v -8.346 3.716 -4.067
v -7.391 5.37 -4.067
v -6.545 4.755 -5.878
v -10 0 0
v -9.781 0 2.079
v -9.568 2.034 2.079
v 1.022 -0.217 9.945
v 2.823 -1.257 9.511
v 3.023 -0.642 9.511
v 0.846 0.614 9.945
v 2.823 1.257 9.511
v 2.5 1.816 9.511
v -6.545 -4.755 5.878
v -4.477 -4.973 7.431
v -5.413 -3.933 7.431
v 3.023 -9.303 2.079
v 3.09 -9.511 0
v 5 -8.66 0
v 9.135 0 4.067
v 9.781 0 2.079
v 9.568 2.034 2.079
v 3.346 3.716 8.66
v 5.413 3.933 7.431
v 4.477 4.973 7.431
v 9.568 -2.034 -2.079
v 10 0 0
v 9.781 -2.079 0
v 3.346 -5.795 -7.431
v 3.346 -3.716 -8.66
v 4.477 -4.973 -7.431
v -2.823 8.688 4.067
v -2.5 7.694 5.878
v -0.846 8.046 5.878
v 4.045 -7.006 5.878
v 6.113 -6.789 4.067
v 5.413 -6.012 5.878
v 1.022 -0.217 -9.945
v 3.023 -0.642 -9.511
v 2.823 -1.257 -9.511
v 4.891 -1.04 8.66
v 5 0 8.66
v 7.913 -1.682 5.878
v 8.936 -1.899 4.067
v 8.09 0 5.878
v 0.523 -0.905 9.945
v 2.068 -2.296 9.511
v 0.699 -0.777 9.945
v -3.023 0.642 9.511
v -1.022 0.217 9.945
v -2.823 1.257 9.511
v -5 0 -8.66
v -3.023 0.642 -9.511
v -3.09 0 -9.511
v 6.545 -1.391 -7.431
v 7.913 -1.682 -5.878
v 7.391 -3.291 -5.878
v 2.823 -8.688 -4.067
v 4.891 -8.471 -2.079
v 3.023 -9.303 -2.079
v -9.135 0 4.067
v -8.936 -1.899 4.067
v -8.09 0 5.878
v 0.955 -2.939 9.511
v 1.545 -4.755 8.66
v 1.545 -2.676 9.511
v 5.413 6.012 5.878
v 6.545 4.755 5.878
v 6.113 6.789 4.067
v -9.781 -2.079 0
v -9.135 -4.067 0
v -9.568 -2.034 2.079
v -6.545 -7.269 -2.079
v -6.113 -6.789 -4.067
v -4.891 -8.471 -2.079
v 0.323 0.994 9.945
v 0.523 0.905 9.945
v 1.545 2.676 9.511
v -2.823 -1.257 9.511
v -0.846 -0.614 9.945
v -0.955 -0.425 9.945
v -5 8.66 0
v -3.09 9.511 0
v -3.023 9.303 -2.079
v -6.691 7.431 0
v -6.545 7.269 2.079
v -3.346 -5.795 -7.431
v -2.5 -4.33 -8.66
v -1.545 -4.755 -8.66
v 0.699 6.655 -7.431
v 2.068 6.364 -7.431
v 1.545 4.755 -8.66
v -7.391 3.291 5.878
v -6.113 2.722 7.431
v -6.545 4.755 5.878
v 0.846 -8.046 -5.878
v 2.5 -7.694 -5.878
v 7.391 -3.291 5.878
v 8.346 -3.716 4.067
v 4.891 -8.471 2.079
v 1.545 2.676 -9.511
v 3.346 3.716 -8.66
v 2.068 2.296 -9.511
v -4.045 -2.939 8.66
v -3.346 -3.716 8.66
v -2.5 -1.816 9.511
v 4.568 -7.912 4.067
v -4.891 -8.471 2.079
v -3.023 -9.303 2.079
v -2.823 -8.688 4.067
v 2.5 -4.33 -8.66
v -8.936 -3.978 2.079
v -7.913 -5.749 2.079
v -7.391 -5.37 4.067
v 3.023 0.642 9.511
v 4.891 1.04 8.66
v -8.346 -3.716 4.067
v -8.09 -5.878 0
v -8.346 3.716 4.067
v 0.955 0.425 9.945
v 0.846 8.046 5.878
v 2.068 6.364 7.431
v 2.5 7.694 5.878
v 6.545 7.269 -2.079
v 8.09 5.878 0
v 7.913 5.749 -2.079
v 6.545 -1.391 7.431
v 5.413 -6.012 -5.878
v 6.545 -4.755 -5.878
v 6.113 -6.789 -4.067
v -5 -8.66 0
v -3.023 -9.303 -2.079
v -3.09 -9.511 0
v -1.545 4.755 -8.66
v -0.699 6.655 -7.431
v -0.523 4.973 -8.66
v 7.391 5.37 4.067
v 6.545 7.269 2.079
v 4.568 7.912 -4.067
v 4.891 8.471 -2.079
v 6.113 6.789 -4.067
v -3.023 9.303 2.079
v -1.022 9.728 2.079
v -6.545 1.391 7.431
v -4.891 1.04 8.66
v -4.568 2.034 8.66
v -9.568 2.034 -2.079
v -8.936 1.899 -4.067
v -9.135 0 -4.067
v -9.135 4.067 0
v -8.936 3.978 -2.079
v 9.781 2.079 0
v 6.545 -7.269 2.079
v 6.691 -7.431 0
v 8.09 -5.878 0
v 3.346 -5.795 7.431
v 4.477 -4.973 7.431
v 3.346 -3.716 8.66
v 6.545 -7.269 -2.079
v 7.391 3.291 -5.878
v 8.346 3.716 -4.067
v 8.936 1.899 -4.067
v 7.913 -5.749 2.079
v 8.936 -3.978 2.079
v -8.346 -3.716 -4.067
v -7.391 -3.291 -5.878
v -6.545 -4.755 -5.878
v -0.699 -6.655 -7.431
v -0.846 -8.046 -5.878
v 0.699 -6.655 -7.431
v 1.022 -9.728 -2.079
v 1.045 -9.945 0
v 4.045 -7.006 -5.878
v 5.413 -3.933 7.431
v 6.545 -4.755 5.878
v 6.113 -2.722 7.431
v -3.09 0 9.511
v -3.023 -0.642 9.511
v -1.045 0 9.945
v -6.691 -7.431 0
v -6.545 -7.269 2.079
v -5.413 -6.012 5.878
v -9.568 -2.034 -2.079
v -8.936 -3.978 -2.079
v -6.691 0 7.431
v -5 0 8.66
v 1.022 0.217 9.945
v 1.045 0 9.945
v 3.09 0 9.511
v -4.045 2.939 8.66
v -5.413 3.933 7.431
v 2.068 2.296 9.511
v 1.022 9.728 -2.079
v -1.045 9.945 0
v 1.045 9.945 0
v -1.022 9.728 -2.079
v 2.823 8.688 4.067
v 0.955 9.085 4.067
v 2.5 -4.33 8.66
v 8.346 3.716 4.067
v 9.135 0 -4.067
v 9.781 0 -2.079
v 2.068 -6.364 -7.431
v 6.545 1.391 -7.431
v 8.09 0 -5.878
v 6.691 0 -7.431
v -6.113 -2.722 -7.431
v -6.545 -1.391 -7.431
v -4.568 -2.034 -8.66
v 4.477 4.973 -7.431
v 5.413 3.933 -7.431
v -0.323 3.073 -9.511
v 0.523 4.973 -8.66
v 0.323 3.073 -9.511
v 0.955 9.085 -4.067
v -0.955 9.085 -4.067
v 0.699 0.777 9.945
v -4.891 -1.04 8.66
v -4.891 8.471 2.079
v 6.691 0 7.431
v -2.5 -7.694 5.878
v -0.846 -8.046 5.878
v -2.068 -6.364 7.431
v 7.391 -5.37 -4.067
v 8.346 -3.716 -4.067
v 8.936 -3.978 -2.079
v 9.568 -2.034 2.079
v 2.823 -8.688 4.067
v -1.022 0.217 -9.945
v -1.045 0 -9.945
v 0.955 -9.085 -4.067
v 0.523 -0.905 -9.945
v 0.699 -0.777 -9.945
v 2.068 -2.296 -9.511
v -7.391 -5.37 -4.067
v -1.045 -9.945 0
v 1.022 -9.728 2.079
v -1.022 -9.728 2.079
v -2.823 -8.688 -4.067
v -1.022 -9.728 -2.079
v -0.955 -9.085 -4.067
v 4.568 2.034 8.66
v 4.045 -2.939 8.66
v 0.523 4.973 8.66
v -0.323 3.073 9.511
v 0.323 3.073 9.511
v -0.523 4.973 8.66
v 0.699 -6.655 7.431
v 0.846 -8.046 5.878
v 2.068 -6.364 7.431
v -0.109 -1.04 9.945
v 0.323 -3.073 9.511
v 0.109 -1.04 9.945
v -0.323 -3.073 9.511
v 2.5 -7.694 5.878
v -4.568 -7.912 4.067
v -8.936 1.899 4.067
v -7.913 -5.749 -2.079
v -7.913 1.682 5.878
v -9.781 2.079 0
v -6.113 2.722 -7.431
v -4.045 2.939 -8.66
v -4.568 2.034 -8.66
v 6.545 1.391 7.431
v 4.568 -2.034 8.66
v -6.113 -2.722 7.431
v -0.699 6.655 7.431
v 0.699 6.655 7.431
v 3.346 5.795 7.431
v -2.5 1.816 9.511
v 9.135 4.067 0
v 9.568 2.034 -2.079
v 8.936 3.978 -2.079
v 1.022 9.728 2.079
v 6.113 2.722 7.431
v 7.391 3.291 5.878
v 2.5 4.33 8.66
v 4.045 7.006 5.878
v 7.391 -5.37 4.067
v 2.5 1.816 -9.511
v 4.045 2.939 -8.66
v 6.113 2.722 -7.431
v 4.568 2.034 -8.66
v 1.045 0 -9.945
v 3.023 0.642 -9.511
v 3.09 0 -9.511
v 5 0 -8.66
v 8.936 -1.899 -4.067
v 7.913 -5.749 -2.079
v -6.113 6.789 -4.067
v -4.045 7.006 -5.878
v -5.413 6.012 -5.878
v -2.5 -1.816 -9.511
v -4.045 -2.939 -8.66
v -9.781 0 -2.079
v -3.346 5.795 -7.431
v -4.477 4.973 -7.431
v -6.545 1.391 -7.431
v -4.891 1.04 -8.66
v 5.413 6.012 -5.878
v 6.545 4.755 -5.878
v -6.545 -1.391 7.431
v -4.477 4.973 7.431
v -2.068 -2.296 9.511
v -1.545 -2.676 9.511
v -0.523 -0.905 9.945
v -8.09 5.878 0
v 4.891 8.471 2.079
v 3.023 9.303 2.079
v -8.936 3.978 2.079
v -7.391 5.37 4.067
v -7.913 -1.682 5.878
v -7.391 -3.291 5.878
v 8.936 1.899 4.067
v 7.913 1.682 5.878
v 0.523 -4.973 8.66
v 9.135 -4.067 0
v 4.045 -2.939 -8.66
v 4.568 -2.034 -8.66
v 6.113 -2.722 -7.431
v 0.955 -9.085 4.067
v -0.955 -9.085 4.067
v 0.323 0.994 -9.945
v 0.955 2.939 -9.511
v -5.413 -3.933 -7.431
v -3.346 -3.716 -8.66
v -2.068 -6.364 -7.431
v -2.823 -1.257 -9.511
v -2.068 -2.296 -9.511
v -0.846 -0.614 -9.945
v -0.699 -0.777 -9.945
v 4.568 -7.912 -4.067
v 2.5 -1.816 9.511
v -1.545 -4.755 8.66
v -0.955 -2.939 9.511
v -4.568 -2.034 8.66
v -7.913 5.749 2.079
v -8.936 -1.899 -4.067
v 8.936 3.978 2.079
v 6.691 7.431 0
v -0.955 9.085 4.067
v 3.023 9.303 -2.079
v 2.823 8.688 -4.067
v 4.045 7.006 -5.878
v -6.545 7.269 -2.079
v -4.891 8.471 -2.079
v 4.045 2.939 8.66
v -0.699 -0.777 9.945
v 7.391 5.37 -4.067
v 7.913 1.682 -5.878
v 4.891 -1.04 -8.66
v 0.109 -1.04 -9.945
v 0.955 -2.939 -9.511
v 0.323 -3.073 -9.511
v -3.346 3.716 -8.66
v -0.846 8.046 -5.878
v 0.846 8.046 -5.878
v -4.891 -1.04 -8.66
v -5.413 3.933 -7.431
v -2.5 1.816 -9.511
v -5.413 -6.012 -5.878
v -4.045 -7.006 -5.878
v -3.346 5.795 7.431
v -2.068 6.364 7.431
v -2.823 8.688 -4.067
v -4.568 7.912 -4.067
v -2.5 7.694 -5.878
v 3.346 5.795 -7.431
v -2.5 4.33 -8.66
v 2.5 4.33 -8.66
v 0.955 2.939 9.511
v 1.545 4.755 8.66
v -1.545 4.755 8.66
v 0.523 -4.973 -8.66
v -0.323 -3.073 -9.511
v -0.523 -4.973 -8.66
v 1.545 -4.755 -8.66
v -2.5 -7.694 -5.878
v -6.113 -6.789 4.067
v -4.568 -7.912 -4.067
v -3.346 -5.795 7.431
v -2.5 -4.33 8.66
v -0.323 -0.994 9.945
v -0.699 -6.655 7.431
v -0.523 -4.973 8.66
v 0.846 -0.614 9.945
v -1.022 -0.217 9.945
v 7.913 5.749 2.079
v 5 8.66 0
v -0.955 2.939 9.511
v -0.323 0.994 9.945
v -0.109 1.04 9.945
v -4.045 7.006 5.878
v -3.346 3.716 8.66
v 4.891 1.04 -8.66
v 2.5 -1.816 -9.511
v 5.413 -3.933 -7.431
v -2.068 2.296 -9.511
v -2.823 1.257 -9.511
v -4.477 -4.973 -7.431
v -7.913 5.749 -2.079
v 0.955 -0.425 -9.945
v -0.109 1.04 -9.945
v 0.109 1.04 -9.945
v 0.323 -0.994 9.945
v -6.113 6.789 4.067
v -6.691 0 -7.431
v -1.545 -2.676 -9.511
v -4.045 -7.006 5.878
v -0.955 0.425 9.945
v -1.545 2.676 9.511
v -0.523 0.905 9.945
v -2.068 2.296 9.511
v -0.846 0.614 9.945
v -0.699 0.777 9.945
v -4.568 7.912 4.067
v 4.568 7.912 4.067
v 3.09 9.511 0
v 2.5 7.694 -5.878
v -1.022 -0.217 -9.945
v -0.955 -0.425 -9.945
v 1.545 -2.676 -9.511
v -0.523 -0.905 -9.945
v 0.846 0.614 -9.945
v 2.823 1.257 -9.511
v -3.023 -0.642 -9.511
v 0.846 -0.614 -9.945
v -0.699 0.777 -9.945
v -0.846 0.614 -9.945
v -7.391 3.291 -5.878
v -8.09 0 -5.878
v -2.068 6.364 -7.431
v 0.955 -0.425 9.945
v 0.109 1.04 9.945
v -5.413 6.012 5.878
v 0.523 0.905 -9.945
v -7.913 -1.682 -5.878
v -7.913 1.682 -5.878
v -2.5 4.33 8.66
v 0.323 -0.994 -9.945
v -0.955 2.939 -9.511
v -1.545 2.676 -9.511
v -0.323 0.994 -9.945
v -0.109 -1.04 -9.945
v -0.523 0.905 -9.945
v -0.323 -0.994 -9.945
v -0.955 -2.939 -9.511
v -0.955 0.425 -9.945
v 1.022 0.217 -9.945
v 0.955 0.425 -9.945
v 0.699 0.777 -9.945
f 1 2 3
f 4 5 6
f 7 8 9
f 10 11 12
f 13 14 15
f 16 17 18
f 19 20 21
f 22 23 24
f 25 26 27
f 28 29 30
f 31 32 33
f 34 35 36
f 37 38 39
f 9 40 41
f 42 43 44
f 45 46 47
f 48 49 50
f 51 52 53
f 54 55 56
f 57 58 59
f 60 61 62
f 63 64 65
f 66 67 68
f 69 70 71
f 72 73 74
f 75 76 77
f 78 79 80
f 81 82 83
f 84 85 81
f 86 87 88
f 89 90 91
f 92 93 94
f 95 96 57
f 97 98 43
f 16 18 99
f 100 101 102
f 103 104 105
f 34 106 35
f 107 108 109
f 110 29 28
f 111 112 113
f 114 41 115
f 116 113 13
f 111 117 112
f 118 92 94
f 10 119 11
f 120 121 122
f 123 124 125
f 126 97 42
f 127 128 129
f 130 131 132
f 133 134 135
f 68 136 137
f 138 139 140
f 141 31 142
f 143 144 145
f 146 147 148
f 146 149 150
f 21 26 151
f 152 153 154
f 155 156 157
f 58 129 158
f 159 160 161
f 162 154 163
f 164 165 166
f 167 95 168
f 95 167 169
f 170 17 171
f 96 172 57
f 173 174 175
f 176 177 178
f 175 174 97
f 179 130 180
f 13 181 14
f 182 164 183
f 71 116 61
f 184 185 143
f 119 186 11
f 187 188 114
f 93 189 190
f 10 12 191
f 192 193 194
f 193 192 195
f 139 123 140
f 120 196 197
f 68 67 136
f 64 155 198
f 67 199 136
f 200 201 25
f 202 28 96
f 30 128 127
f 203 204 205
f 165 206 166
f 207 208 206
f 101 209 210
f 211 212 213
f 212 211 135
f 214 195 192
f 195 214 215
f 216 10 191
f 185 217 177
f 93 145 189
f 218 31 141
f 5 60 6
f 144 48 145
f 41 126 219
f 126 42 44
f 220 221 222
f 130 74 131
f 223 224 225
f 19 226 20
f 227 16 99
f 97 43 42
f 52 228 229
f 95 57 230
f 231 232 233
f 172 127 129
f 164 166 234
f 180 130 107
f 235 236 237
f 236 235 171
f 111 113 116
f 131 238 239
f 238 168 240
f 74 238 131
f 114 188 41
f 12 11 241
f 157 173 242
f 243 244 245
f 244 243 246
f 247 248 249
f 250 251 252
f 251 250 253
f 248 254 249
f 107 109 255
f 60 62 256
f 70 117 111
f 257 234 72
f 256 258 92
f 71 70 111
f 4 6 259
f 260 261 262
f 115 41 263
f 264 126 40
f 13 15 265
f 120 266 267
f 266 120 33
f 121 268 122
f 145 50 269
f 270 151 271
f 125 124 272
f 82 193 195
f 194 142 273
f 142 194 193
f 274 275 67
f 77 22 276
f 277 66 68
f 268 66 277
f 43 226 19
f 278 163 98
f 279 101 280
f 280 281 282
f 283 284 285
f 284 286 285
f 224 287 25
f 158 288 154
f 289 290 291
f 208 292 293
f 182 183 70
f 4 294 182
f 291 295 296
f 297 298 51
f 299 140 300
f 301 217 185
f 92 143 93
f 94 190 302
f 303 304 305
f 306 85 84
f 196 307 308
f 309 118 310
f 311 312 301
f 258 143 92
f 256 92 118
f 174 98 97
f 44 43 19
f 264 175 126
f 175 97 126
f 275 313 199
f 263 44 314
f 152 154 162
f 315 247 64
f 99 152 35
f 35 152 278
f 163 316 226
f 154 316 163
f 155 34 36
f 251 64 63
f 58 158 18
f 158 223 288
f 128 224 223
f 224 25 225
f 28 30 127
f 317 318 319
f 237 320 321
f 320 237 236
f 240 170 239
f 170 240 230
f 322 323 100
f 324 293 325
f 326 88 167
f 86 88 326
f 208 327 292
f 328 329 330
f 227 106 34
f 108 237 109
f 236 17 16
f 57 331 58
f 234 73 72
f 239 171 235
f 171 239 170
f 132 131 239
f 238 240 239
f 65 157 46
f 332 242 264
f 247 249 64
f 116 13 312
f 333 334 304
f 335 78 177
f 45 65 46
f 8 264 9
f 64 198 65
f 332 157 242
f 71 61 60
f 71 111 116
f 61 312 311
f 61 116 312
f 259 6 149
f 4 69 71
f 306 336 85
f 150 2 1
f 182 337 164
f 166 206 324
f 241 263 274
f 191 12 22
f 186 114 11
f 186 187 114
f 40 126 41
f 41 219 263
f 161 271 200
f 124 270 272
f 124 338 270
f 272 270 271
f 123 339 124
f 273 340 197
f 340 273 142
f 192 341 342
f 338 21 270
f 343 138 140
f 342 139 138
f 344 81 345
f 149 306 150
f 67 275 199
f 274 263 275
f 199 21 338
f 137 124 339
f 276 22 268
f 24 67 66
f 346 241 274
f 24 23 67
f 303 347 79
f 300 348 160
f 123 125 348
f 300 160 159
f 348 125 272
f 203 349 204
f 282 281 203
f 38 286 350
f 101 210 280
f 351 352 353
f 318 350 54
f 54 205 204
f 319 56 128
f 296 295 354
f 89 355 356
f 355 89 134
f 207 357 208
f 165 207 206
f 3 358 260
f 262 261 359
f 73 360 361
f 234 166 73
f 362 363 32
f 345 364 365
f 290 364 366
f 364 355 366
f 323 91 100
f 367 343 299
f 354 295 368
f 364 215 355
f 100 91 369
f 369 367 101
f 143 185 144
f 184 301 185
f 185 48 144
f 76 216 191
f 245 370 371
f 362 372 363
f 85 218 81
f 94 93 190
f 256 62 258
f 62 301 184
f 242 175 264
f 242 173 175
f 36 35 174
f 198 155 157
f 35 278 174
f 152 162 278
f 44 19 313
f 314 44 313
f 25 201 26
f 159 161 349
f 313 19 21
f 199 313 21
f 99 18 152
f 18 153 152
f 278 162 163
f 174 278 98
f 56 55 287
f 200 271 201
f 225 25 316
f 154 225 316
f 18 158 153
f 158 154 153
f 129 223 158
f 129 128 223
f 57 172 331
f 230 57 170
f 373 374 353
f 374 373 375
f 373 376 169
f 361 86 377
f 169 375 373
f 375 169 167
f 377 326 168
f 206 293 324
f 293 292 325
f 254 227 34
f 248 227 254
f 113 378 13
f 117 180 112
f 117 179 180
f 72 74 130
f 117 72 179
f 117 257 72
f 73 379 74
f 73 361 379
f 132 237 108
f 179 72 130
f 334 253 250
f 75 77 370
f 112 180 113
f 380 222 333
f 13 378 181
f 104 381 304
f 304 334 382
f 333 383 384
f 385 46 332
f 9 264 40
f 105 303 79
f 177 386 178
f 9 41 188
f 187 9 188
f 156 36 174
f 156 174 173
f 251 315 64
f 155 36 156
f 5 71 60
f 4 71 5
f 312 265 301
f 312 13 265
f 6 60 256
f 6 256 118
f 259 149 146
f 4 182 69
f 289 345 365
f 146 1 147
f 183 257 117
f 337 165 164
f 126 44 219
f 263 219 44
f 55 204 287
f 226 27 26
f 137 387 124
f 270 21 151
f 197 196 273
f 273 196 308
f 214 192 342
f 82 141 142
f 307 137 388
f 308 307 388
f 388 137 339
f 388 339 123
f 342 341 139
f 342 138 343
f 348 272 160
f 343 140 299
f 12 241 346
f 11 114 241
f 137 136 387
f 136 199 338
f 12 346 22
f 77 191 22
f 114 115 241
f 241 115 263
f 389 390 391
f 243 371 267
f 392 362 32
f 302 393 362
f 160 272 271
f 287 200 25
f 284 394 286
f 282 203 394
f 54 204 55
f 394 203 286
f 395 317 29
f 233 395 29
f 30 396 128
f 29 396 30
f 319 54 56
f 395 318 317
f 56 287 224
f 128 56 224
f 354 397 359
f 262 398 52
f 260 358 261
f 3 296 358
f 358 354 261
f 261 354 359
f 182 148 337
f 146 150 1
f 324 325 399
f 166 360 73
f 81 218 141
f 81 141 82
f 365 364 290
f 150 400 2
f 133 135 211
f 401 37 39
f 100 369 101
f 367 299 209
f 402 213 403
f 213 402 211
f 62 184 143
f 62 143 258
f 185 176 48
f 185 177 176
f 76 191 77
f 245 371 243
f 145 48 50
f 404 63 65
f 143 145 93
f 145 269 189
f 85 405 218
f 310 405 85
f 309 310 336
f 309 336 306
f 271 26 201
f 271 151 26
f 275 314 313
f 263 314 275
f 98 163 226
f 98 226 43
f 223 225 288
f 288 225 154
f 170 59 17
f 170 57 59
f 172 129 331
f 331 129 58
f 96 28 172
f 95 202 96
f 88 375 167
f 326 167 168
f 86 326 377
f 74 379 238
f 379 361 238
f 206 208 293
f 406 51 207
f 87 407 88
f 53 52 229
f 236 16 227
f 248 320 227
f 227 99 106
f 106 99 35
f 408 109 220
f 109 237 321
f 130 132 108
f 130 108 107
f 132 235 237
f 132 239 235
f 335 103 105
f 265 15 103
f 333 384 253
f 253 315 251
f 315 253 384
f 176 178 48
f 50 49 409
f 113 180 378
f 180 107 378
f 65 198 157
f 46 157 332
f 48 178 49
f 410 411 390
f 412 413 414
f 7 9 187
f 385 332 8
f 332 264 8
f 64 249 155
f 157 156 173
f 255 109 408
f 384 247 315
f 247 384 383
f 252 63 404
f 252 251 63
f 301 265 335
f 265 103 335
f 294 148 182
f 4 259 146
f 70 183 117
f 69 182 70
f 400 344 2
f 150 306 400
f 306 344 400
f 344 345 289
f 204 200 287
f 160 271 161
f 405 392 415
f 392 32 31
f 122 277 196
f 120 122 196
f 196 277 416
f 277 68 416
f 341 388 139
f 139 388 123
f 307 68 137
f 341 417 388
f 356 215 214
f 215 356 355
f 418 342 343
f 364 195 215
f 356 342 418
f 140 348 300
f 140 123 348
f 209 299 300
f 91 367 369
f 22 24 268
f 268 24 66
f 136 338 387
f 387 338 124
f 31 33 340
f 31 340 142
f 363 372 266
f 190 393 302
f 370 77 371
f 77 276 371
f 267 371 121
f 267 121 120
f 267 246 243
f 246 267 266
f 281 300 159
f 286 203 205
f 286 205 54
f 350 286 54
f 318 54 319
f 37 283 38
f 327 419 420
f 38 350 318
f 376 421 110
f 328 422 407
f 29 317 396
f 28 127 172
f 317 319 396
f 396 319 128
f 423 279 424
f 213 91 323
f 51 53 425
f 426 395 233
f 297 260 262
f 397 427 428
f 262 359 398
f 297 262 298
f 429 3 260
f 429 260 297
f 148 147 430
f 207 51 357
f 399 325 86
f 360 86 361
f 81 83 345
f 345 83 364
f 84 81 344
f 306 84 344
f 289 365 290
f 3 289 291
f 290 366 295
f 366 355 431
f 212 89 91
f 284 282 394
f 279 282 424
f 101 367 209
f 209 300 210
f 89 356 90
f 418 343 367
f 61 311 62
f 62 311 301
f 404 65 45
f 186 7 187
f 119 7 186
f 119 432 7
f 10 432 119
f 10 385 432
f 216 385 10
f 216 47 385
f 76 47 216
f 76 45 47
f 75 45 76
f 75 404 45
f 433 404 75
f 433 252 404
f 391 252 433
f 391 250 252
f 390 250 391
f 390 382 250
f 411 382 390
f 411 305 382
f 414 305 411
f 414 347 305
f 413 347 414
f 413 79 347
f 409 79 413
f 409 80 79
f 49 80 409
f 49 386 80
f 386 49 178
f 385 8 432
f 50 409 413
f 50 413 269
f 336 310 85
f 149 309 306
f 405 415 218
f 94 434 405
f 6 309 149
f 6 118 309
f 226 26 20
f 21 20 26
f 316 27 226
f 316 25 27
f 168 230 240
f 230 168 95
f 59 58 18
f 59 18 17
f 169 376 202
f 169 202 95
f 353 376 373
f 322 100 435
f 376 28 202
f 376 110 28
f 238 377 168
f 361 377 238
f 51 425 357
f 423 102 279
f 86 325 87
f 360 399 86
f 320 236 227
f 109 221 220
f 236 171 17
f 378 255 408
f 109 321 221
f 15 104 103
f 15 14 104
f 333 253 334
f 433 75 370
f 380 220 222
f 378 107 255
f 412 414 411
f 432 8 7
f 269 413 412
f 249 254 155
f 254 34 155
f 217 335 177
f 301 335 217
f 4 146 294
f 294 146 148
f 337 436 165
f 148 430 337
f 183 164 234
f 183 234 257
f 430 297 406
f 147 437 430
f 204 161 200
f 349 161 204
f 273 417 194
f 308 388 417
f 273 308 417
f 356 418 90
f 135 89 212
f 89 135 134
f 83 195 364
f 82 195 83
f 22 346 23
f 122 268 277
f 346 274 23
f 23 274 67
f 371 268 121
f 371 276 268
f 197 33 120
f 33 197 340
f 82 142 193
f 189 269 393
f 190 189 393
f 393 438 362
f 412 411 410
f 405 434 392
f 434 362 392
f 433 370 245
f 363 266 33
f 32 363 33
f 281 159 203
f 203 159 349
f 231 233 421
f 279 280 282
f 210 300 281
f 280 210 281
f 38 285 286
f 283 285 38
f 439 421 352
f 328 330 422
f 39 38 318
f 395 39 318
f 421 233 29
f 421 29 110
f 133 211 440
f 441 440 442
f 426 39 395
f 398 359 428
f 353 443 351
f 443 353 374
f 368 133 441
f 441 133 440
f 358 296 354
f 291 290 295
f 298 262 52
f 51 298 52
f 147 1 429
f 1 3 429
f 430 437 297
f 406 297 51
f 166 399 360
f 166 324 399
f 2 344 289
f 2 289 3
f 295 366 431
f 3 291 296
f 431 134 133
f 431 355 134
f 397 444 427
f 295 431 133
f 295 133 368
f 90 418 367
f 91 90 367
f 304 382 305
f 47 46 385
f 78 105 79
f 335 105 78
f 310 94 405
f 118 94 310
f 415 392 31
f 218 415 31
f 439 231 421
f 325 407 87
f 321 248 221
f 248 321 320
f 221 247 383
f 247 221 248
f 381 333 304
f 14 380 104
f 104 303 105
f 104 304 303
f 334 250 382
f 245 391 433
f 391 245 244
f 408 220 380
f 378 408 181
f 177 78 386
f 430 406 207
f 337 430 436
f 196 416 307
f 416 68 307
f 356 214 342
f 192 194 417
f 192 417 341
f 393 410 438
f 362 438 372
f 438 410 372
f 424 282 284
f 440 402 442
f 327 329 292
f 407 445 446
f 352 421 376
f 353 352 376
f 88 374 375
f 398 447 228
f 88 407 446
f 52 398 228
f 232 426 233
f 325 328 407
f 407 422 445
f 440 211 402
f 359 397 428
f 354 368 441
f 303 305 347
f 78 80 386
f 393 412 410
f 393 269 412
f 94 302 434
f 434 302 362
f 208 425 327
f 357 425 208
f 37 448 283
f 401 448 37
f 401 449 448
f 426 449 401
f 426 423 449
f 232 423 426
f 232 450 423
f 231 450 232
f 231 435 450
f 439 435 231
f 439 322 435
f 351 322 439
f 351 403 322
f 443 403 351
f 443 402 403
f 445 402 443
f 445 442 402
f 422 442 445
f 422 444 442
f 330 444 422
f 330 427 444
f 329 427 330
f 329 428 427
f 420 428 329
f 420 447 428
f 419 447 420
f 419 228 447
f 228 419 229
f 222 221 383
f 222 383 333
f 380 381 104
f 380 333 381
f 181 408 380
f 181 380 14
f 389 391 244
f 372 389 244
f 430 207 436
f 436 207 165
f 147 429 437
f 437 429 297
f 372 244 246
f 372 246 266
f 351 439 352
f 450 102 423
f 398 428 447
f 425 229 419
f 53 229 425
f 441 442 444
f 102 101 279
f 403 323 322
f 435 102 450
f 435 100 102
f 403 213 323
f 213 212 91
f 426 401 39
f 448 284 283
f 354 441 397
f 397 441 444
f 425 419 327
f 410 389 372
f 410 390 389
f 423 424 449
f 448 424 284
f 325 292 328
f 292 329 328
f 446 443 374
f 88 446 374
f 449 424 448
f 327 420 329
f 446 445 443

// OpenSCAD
module transparent() {
 %children();
}

difference() {
  sphere(r=10);
  transparent() cylinder(h=30, r=6, center=true);
}
